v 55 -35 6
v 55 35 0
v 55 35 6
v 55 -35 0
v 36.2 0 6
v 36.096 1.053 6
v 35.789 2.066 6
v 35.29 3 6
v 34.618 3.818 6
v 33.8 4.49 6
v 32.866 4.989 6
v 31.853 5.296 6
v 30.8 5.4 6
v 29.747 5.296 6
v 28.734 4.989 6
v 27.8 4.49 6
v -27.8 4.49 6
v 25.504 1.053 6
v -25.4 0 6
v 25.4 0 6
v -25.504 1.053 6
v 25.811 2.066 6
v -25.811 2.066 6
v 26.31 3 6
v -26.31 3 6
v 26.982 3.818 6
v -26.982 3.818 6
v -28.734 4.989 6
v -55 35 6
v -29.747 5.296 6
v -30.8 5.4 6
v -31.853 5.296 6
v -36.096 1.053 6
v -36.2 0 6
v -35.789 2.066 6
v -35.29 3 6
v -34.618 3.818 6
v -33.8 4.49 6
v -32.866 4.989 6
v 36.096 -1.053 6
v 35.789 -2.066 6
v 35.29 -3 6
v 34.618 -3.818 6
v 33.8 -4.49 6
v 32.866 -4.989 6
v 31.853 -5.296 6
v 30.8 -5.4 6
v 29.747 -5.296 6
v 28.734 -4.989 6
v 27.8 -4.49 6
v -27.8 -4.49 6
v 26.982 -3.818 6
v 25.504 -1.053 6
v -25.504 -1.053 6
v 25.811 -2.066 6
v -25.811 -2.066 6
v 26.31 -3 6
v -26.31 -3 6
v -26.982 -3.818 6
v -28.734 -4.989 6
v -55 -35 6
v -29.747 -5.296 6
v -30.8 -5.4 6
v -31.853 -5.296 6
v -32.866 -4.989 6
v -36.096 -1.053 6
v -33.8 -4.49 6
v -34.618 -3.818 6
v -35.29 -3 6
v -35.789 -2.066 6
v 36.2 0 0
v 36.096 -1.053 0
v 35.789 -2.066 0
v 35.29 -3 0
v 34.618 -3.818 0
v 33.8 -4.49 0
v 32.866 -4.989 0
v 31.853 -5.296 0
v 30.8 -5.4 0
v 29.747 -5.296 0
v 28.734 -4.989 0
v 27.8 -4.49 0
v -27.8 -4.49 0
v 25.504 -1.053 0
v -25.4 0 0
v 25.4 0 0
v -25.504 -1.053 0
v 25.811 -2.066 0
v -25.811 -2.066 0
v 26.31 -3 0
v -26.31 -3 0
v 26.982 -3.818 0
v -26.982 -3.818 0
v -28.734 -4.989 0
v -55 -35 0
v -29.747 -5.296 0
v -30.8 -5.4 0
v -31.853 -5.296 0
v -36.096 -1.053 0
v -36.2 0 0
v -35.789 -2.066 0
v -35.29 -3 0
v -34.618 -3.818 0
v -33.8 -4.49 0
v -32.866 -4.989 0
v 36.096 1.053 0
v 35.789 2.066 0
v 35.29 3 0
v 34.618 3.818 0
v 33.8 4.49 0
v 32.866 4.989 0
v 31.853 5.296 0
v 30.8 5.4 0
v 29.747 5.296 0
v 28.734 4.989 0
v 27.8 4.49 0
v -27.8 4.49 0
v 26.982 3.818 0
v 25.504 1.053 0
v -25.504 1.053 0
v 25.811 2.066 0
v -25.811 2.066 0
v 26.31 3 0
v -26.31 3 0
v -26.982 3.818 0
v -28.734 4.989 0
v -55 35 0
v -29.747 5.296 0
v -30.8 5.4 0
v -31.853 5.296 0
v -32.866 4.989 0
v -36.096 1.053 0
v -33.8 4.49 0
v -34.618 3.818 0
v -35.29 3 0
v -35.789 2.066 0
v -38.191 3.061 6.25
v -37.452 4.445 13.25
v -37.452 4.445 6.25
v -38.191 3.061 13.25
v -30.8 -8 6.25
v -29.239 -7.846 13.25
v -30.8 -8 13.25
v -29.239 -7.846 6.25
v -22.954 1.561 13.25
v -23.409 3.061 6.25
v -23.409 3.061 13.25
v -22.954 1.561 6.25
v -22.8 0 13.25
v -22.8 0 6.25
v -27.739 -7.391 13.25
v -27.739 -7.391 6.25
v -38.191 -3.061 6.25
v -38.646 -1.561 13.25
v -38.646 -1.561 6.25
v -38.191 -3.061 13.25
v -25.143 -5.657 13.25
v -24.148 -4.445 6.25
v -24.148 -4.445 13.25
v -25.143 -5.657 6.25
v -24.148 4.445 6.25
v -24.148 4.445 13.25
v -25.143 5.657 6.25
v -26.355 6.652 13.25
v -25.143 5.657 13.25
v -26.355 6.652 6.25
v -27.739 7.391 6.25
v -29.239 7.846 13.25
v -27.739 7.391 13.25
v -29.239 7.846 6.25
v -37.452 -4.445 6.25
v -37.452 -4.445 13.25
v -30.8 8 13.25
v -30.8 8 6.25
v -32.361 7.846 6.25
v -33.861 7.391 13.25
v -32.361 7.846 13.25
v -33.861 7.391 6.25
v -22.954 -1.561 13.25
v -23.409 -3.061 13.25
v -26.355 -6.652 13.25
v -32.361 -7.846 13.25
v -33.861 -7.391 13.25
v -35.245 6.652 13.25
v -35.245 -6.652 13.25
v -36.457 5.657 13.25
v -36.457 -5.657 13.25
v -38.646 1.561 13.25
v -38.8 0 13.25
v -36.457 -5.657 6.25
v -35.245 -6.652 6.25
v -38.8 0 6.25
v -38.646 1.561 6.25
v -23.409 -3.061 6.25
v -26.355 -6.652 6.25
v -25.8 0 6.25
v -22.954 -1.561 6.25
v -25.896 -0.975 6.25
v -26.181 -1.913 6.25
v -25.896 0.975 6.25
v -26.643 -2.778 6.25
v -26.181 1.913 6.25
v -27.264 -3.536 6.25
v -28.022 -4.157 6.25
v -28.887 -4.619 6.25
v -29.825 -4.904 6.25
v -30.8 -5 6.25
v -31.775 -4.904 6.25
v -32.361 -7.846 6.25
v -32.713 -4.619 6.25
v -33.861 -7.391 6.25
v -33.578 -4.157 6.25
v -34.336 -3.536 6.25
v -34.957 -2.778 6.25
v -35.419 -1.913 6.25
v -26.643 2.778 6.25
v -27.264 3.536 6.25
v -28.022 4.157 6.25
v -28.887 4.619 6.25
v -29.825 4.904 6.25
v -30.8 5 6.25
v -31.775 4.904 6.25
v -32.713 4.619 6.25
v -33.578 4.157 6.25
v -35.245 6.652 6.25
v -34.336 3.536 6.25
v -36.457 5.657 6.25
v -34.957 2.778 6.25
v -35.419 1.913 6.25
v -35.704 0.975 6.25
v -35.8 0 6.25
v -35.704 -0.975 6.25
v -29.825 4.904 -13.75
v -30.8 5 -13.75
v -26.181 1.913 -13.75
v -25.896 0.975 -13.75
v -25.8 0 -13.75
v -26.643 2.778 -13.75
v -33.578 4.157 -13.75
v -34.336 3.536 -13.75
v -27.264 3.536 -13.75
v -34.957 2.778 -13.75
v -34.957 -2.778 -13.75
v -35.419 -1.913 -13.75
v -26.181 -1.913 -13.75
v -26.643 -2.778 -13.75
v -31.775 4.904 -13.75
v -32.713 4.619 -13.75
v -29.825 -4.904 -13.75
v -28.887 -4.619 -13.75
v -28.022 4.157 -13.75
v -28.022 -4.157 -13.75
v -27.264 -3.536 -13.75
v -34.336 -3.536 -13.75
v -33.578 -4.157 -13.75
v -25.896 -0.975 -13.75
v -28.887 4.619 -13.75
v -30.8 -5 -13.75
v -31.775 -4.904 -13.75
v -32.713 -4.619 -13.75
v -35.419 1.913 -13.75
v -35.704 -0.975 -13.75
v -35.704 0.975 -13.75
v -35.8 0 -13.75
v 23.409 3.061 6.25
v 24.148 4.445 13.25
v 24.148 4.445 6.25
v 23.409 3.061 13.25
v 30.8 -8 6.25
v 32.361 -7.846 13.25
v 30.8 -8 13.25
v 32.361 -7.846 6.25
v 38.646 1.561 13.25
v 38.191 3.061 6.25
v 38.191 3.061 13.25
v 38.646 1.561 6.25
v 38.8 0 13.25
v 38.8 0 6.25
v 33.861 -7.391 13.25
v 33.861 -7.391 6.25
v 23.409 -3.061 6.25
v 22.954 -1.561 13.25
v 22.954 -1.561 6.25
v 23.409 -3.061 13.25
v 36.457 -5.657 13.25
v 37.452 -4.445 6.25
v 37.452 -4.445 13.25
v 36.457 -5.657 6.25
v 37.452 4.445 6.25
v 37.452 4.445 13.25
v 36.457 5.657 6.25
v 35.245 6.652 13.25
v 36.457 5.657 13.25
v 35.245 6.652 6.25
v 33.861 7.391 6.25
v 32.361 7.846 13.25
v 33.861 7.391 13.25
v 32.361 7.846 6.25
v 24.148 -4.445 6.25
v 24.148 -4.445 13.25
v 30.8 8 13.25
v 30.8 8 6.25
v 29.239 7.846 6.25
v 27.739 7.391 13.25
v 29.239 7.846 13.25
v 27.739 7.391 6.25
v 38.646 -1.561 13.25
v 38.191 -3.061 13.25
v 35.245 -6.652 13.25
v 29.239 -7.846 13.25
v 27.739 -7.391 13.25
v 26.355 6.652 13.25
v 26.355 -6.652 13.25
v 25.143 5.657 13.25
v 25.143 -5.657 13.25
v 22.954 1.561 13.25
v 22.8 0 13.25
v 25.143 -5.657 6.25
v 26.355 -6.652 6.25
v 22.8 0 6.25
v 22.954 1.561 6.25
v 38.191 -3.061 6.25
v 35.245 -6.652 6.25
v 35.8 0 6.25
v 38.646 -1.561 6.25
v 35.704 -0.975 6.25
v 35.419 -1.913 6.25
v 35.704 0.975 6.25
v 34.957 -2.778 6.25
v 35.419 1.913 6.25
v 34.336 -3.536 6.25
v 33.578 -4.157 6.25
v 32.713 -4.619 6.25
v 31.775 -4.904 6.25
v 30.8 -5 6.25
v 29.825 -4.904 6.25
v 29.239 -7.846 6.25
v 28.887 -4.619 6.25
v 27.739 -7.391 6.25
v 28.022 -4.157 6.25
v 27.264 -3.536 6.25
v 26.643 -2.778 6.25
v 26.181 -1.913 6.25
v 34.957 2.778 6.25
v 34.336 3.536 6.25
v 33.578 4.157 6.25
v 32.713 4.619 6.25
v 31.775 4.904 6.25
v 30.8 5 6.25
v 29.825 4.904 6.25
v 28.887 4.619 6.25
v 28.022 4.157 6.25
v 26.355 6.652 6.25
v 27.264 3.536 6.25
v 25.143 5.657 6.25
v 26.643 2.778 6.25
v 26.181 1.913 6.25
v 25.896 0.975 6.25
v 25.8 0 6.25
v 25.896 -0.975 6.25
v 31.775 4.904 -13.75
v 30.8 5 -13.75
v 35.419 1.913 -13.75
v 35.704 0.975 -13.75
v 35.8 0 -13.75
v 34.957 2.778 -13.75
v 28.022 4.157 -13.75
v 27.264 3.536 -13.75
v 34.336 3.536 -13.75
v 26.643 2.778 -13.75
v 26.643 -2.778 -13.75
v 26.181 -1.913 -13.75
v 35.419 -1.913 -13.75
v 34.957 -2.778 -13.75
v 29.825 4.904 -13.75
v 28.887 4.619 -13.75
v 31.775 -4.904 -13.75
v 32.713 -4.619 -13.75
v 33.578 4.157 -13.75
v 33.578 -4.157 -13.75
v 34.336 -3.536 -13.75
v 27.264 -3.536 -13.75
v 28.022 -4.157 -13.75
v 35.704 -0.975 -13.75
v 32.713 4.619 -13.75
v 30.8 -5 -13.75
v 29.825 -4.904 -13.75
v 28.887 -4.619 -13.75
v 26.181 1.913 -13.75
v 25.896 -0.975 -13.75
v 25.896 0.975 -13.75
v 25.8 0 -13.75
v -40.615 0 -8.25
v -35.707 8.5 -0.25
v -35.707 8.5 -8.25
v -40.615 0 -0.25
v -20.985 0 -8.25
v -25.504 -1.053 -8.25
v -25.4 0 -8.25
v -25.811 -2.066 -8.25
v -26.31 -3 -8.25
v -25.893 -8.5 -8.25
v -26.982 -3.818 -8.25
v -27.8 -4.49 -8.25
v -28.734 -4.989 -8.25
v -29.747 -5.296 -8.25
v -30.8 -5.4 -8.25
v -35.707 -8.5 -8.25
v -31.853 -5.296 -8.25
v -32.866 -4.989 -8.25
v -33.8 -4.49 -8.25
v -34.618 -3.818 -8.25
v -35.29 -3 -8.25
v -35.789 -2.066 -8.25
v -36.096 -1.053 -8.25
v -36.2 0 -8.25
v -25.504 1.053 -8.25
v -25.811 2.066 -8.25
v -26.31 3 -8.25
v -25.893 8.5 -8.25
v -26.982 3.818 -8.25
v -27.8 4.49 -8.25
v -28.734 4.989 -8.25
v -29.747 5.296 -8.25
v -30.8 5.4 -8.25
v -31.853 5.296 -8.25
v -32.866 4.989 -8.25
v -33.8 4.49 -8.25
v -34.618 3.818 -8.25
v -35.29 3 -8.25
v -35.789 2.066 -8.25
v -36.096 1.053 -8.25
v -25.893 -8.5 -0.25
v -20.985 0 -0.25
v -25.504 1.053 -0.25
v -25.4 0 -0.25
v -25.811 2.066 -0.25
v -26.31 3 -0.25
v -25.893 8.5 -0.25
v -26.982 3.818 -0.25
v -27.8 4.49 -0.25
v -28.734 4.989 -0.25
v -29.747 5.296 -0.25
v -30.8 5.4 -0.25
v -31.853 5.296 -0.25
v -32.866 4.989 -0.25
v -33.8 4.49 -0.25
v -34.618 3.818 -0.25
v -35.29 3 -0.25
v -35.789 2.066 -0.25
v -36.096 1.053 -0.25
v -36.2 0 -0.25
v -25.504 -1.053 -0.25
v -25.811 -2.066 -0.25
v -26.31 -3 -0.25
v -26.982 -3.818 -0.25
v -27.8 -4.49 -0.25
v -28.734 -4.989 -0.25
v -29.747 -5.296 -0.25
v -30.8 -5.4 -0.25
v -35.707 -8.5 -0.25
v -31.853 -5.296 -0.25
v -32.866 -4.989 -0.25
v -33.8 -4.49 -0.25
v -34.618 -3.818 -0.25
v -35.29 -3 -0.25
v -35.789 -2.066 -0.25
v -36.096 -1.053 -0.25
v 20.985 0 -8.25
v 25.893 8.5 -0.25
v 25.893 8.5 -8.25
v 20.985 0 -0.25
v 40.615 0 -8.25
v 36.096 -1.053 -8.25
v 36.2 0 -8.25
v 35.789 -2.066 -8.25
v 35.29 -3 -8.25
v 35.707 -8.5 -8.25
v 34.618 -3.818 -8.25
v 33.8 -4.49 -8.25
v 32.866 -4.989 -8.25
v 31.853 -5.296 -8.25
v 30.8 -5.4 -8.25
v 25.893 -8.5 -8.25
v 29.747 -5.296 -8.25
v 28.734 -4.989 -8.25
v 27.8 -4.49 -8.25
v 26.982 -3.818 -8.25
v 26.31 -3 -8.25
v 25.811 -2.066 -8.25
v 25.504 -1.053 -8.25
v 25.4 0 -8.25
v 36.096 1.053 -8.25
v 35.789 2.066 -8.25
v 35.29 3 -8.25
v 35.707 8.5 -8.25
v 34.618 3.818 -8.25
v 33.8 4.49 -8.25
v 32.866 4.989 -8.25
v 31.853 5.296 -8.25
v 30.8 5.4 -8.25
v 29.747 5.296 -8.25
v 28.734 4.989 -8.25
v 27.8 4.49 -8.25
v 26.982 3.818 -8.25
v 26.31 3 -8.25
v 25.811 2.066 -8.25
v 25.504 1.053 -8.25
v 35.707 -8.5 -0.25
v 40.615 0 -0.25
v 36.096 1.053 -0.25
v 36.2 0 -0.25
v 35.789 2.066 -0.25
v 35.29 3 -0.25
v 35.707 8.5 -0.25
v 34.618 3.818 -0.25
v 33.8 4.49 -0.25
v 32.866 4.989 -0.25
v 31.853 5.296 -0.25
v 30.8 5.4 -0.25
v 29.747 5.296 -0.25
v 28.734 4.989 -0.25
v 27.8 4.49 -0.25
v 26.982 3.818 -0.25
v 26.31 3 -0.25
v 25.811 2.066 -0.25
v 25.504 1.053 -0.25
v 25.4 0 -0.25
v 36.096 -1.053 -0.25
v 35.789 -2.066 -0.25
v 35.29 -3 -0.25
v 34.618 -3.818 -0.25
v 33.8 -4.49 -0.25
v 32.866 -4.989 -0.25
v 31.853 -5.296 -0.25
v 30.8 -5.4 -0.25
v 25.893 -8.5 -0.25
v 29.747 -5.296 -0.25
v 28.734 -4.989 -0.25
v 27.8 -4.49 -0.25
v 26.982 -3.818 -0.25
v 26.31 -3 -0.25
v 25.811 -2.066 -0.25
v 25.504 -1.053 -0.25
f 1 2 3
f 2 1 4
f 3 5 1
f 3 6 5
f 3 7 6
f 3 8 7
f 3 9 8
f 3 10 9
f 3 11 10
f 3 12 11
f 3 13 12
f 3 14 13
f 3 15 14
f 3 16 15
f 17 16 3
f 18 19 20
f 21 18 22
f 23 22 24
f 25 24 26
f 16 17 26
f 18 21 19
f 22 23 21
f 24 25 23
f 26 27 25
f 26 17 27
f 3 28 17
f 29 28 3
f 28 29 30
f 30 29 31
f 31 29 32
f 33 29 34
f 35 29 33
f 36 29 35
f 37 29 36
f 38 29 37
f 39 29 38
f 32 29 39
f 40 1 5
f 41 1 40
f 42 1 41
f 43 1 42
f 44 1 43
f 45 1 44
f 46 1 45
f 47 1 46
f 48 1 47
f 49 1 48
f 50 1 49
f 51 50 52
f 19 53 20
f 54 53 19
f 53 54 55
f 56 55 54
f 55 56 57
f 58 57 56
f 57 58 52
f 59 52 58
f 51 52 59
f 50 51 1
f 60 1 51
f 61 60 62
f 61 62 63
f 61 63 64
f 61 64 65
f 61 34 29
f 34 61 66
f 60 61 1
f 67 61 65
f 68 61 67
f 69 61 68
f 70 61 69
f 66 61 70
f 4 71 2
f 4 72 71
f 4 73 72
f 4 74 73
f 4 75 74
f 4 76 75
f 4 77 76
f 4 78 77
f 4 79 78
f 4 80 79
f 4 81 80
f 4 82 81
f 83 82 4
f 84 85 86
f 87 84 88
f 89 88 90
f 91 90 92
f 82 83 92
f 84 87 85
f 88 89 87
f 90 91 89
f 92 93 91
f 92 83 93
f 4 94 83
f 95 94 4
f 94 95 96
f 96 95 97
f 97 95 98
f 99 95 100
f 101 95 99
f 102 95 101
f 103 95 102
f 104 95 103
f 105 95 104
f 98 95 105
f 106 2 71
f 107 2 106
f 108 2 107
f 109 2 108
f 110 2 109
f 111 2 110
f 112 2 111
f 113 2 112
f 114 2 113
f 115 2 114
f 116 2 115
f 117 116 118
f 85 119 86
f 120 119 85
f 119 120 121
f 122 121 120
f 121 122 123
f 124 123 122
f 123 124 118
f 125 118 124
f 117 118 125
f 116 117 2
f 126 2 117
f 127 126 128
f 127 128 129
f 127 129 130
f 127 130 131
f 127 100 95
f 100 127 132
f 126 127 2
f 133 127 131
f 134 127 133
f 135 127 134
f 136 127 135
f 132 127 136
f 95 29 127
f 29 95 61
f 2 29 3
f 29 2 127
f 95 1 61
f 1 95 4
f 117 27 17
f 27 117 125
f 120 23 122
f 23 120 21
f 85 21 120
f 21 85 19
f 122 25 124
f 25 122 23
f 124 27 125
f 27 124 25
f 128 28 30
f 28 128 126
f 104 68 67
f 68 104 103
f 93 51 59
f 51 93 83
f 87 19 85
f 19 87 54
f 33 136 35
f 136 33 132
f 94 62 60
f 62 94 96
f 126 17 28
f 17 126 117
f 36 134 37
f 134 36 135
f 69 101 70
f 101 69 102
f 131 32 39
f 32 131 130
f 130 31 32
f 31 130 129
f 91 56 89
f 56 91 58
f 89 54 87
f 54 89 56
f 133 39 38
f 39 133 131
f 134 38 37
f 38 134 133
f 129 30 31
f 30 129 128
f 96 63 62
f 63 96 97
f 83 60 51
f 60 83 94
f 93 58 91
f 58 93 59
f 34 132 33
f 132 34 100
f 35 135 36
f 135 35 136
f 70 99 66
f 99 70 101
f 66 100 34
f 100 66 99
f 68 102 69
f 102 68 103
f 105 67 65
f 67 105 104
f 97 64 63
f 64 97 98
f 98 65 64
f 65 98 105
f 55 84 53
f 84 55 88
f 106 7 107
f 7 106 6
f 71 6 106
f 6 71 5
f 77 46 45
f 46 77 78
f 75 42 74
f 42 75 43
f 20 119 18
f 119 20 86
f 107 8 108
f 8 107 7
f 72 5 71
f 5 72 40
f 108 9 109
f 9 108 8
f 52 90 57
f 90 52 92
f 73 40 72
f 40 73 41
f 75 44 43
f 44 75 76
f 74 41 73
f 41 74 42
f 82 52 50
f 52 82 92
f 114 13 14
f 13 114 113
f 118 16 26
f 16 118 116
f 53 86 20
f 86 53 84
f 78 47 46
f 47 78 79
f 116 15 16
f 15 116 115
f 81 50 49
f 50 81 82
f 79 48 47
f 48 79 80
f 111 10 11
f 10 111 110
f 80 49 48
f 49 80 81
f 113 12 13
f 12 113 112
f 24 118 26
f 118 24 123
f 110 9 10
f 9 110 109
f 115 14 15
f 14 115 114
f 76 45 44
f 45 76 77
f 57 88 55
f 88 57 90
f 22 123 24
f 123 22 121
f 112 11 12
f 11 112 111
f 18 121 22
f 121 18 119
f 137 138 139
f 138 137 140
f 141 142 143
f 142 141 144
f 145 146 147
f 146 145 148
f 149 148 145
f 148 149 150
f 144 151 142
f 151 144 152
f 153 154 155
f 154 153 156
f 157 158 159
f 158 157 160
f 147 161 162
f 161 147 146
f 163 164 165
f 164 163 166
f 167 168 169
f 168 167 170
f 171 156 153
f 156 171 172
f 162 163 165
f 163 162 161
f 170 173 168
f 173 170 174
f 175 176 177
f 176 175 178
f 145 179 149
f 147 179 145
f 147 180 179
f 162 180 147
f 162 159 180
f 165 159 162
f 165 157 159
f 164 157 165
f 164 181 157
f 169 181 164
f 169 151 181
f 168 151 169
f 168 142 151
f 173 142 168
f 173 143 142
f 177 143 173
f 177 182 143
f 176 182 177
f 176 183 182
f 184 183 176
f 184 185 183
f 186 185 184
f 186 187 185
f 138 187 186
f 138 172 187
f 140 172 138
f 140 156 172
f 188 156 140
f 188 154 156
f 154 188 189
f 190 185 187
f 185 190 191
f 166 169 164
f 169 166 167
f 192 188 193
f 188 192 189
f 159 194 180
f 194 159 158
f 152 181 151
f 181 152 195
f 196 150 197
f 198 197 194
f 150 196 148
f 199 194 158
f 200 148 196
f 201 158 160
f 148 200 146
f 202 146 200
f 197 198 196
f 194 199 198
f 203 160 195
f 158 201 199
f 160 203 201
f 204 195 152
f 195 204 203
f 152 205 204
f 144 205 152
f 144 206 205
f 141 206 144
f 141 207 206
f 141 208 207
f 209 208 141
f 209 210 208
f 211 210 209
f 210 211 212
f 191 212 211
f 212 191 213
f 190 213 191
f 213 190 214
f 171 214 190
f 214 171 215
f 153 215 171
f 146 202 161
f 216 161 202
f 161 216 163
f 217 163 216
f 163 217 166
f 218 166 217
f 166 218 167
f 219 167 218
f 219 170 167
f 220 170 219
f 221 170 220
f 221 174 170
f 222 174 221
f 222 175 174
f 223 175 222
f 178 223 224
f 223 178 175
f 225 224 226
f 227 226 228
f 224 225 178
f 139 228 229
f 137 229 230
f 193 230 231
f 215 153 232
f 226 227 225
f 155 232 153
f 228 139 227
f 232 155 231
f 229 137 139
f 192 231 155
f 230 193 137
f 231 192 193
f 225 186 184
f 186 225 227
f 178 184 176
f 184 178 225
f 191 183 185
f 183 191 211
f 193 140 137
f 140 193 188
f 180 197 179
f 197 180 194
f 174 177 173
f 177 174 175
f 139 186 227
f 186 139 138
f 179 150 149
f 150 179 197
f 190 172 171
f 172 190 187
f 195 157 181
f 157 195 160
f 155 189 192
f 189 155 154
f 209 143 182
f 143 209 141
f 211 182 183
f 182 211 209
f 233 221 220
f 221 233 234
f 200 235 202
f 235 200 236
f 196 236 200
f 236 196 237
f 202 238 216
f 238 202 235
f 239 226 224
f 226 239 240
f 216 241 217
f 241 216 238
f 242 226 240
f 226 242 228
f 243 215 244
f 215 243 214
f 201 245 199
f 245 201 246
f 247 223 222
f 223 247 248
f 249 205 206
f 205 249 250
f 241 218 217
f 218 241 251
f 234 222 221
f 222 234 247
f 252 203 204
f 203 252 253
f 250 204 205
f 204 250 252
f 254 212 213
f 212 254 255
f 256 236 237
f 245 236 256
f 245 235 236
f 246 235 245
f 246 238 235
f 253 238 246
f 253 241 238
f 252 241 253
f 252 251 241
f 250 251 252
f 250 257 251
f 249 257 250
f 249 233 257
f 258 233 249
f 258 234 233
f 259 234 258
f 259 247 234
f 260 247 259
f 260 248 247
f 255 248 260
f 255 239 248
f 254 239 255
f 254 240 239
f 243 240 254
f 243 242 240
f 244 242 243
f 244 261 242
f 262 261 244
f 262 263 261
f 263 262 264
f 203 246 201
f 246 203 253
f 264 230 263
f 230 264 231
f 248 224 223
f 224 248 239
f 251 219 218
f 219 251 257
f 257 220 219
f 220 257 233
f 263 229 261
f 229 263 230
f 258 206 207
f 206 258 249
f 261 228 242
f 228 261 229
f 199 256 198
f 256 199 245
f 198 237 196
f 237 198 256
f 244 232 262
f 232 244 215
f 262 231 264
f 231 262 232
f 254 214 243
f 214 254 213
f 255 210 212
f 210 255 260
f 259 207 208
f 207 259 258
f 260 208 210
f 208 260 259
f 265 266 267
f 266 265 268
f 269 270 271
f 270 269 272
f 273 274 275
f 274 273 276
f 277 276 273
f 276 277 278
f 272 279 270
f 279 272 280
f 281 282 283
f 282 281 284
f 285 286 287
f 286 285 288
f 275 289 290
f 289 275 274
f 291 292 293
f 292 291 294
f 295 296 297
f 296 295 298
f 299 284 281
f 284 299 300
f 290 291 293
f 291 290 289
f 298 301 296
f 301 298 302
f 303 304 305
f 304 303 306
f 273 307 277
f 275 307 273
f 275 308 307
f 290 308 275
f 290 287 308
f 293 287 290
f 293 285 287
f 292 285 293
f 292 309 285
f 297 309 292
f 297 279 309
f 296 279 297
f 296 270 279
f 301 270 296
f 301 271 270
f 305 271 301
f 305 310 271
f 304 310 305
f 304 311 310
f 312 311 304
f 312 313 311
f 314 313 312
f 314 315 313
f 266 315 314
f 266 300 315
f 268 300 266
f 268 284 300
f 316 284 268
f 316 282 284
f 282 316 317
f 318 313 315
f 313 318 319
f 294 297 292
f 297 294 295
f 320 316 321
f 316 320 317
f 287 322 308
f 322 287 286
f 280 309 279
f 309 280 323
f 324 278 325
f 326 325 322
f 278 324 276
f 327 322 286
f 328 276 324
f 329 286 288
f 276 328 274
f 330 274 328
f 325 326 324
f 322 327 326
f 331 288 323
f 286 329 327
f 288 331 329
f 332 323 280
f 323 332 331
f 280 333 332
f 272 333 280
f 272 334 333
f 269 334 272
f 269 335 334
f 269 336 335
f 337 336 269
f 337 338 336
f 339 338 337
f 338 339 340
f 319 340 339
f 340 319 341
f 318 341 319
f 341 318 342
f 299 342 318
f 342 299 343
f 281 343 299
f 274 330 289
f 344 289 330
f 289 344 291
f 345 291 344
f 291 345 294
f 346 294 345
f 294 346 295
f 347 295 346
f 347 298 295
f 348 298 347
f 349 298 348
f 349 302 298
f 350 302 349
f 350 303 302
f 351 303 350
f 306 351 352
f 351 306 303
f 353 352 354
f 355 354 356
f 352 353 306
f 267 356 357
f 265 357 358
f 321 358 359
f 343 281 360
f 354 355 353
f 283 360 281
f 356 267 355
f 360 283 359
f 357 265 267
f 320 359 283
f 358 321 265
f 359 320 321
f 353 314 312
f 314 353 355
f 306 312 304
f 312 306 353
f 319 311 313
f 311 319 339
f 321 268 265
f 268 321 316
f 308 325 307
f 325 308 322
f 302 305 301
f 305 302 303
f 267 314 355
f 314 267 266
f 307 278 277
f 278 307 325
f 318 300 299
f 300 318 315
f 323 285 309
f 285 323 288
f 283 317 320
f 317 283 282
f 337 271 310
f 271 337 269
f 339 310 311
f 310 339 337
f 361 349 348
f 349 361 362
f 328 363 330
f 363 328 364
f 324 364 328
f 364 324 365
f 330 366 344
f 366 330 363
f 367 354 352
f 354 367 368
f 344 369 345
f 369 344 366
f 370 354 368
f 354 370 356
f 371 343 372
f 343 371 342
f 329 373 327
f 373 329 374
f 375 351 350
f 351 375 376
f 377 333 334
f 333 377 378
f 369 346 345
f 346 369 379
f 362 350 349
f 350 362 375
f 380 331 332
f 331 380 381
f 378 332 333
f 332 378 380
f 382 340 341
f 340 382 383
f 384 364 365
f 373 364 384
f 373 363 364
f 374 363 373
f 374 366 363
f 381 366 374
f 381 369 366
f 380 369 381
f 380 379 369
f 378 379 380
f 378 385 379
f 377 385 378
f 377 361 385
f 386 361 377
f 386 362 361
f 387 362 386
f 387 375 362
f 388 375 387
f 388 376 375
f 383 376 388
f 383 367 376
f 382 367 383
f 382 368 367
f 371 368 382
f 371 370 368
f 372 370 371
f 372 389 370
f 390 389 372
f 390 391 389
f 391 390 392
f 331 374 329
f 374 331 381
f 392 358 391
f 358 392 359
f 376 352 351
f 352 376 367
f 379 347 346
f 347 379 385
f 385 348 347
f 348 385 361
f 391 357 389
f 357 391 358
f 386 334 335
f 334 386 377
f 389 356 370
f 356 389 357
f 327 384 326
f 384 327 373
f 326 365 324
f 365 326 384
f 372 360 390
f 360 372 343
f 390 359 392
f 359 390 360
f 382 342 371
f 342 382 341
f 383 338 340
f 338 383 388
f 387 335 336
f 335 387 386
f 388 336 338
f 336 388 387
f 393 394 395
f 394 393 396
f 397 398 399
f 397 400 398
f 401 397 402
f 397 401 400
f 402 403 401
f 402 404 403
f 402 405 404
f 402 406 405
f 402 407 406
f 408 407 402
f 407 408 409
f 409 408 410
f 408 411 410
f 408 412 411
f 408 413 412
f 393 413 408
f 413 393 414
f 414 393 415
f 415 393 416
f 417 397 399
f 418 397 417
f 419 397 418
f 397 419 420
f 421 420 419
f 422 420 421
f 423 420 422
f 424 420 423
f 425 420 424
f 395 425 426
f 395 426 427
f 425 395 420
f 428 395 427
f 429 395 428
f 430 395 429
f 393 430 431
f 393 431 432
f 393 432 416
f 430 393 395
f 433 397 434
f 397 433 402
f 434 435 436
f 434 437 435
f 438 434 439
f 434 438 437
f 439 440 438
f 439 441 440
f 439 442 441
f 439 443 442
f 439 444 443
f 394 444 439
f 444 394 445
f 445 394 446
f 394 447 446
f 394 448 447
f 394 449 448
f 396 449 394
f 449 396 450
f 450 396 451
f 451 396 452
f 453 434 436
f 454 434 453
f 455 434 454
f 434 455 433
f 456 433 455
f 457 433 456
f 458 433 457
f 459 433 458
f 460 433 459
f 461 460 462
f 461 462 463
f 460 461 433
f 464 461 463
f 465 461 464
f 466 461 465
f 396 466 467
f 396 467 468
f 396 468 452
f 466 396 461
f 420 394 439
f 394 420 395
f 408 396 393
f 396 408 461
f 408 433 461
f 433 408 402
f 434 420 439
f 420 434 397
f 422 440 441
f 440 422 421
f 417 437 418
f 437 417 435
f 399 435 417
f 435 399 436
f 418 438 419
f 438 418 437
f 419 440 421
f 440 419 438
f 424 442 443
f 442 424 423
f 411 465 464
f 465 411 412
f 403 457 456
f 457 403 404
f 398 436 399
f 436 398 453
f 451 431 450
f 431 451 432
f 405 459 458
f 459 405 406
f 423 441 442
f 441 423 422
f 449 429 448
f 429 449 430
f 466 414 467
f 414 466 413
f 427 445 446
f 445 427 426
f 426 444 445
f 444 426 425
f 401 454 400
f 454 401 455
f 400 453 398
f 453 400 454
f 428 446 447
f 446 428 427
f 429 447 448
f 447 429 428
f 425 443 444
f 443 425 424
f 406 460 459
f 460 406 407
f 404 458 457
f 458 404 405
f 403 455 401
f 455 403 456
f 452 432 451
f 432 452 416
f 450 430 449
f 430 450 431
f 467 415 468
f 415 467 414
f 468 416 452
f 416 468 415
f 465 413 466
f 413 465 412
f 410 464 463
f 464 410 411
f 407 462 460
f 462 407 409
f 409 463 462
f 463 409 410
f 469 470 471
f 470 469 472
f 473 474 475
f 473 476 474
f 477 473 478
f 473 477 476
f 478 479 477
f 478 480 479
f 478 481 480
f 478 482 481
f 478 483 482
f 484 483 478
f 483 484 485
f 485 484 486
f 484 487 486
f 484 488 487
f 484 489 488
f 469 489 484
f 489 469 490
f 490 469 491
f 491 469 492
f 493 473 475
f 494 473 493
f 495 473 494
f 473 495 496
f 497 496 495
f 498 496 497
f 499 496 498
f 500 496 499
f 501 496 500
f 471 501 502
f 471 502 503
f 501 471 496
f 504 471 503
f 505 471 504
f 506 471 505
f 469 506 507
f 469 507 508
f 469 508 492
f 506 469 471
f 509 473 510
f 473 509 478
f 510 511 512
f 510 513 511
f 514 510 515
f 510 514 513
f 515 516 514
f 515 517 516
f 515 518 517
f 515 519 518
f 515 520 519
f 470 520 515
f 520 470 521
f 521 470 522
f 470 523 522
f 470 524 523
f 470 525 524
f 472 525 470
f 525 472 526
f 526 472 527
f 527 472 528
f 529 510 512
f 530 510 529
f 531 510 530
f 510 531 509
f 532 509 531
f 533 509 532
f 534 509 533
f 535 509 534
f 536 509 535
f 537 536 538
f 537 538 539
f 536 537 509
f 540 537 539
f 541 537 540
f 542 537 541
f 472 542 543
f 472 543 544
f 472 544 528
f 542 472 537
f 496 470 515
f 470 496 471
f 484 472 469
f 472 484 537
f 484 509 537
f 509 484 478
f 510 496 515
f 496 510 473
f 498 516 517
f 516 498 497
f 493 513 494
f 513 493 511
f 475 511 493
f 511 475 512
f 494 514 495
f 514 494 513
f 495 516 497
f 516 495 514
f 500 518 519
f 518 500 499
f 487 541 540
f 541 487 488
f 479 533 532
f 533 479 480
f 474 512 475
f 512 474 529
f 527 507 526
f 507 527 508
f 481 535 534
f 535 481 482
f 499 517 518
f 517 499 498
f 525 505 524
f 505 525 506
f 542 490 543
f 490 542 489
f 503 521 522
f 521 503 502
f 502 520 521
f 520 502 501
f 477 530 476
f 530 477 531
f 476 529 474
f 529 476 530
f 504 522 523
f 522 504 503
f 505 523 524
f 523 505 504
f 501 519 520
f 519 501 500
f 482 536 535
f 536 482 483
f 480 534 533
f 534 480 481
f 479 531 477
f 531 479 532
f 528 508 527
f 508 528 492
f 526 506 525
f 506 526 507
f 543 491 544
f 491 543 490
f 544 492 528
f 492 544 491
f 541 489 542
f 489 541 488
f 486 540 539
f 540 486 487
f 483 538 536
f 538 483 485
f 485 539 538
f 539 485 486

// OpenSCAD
$fn = 32;

// ------------------------------------------------------------------------
// Bolted plate: 110 x 70 x 6 mm plate, 2 fasteners
// Every part is its own module, assembly() places them once.
// ------------------------------------------------------------------------

// --- part 1 ---
module plate() {
  difference() {
    translate([-55, -35, 0]) cube([110, 70, 6]);
    translate([-30.8, 0, -1]) cylinder(h = 8, d = 10.8);
    translate([30.8, 0, -1]) cylinder(h = 8, d = 10.8);
  }
}

// --- part 2 ---
module bolt1() {
  cylinder(h = 7, d = 16);
  translate([0, 0, -20]) cylinder(h = 20, d = 10);
}

// --- part 3 ---
module bolt2() {
  cylinder(h = 7, d = 16);
  translate([0, 0, -20]) cylinder(h = 20, d = 10);
}

// --- part 4 ---
module nut1() {
  difference() {
    linear_extrude(height = 8) polygon(points = [[9.815, 0], [4.907, 8.5], [-4.907, 8.5], [-9.815, 0], [-4.907, -8.5], [4.907, -8.5]]);
    translate([0, 0, -1]) cylinder(h = 10, d = 10.8);
  }
}

// --- part 5 ---
module nut2() {
  difference() {
    linear_extrude(height = 8) polygon(points = [[9.815, 0], [4.907, 8.5], [-4.907, 8.5], [-9.815, 0], [-4.907, -8.5], [4.907, -8.5]]);
    translate([0, 0, -1]) cylinder(h = 10, d = 10.8);
  }
}

// --- assembly ---
module assembly() {
  translate([0, 0, 0]) rotate([0, 0, 0]) plate();
  translate([-30.8, 0, 6.25]) rotate([0, 0, 0]) bolt1();
  translate([30.8, 0, 6.25]) rotate([0, 0, 0]) bolt2();
  translate([-30.8, 0, -8.25]) rotate([0, 0, 0]) nut1();
  translate([30.8, 0, -8.25]) rotate([0, 0, 0]) nut2();
}

assembly();
